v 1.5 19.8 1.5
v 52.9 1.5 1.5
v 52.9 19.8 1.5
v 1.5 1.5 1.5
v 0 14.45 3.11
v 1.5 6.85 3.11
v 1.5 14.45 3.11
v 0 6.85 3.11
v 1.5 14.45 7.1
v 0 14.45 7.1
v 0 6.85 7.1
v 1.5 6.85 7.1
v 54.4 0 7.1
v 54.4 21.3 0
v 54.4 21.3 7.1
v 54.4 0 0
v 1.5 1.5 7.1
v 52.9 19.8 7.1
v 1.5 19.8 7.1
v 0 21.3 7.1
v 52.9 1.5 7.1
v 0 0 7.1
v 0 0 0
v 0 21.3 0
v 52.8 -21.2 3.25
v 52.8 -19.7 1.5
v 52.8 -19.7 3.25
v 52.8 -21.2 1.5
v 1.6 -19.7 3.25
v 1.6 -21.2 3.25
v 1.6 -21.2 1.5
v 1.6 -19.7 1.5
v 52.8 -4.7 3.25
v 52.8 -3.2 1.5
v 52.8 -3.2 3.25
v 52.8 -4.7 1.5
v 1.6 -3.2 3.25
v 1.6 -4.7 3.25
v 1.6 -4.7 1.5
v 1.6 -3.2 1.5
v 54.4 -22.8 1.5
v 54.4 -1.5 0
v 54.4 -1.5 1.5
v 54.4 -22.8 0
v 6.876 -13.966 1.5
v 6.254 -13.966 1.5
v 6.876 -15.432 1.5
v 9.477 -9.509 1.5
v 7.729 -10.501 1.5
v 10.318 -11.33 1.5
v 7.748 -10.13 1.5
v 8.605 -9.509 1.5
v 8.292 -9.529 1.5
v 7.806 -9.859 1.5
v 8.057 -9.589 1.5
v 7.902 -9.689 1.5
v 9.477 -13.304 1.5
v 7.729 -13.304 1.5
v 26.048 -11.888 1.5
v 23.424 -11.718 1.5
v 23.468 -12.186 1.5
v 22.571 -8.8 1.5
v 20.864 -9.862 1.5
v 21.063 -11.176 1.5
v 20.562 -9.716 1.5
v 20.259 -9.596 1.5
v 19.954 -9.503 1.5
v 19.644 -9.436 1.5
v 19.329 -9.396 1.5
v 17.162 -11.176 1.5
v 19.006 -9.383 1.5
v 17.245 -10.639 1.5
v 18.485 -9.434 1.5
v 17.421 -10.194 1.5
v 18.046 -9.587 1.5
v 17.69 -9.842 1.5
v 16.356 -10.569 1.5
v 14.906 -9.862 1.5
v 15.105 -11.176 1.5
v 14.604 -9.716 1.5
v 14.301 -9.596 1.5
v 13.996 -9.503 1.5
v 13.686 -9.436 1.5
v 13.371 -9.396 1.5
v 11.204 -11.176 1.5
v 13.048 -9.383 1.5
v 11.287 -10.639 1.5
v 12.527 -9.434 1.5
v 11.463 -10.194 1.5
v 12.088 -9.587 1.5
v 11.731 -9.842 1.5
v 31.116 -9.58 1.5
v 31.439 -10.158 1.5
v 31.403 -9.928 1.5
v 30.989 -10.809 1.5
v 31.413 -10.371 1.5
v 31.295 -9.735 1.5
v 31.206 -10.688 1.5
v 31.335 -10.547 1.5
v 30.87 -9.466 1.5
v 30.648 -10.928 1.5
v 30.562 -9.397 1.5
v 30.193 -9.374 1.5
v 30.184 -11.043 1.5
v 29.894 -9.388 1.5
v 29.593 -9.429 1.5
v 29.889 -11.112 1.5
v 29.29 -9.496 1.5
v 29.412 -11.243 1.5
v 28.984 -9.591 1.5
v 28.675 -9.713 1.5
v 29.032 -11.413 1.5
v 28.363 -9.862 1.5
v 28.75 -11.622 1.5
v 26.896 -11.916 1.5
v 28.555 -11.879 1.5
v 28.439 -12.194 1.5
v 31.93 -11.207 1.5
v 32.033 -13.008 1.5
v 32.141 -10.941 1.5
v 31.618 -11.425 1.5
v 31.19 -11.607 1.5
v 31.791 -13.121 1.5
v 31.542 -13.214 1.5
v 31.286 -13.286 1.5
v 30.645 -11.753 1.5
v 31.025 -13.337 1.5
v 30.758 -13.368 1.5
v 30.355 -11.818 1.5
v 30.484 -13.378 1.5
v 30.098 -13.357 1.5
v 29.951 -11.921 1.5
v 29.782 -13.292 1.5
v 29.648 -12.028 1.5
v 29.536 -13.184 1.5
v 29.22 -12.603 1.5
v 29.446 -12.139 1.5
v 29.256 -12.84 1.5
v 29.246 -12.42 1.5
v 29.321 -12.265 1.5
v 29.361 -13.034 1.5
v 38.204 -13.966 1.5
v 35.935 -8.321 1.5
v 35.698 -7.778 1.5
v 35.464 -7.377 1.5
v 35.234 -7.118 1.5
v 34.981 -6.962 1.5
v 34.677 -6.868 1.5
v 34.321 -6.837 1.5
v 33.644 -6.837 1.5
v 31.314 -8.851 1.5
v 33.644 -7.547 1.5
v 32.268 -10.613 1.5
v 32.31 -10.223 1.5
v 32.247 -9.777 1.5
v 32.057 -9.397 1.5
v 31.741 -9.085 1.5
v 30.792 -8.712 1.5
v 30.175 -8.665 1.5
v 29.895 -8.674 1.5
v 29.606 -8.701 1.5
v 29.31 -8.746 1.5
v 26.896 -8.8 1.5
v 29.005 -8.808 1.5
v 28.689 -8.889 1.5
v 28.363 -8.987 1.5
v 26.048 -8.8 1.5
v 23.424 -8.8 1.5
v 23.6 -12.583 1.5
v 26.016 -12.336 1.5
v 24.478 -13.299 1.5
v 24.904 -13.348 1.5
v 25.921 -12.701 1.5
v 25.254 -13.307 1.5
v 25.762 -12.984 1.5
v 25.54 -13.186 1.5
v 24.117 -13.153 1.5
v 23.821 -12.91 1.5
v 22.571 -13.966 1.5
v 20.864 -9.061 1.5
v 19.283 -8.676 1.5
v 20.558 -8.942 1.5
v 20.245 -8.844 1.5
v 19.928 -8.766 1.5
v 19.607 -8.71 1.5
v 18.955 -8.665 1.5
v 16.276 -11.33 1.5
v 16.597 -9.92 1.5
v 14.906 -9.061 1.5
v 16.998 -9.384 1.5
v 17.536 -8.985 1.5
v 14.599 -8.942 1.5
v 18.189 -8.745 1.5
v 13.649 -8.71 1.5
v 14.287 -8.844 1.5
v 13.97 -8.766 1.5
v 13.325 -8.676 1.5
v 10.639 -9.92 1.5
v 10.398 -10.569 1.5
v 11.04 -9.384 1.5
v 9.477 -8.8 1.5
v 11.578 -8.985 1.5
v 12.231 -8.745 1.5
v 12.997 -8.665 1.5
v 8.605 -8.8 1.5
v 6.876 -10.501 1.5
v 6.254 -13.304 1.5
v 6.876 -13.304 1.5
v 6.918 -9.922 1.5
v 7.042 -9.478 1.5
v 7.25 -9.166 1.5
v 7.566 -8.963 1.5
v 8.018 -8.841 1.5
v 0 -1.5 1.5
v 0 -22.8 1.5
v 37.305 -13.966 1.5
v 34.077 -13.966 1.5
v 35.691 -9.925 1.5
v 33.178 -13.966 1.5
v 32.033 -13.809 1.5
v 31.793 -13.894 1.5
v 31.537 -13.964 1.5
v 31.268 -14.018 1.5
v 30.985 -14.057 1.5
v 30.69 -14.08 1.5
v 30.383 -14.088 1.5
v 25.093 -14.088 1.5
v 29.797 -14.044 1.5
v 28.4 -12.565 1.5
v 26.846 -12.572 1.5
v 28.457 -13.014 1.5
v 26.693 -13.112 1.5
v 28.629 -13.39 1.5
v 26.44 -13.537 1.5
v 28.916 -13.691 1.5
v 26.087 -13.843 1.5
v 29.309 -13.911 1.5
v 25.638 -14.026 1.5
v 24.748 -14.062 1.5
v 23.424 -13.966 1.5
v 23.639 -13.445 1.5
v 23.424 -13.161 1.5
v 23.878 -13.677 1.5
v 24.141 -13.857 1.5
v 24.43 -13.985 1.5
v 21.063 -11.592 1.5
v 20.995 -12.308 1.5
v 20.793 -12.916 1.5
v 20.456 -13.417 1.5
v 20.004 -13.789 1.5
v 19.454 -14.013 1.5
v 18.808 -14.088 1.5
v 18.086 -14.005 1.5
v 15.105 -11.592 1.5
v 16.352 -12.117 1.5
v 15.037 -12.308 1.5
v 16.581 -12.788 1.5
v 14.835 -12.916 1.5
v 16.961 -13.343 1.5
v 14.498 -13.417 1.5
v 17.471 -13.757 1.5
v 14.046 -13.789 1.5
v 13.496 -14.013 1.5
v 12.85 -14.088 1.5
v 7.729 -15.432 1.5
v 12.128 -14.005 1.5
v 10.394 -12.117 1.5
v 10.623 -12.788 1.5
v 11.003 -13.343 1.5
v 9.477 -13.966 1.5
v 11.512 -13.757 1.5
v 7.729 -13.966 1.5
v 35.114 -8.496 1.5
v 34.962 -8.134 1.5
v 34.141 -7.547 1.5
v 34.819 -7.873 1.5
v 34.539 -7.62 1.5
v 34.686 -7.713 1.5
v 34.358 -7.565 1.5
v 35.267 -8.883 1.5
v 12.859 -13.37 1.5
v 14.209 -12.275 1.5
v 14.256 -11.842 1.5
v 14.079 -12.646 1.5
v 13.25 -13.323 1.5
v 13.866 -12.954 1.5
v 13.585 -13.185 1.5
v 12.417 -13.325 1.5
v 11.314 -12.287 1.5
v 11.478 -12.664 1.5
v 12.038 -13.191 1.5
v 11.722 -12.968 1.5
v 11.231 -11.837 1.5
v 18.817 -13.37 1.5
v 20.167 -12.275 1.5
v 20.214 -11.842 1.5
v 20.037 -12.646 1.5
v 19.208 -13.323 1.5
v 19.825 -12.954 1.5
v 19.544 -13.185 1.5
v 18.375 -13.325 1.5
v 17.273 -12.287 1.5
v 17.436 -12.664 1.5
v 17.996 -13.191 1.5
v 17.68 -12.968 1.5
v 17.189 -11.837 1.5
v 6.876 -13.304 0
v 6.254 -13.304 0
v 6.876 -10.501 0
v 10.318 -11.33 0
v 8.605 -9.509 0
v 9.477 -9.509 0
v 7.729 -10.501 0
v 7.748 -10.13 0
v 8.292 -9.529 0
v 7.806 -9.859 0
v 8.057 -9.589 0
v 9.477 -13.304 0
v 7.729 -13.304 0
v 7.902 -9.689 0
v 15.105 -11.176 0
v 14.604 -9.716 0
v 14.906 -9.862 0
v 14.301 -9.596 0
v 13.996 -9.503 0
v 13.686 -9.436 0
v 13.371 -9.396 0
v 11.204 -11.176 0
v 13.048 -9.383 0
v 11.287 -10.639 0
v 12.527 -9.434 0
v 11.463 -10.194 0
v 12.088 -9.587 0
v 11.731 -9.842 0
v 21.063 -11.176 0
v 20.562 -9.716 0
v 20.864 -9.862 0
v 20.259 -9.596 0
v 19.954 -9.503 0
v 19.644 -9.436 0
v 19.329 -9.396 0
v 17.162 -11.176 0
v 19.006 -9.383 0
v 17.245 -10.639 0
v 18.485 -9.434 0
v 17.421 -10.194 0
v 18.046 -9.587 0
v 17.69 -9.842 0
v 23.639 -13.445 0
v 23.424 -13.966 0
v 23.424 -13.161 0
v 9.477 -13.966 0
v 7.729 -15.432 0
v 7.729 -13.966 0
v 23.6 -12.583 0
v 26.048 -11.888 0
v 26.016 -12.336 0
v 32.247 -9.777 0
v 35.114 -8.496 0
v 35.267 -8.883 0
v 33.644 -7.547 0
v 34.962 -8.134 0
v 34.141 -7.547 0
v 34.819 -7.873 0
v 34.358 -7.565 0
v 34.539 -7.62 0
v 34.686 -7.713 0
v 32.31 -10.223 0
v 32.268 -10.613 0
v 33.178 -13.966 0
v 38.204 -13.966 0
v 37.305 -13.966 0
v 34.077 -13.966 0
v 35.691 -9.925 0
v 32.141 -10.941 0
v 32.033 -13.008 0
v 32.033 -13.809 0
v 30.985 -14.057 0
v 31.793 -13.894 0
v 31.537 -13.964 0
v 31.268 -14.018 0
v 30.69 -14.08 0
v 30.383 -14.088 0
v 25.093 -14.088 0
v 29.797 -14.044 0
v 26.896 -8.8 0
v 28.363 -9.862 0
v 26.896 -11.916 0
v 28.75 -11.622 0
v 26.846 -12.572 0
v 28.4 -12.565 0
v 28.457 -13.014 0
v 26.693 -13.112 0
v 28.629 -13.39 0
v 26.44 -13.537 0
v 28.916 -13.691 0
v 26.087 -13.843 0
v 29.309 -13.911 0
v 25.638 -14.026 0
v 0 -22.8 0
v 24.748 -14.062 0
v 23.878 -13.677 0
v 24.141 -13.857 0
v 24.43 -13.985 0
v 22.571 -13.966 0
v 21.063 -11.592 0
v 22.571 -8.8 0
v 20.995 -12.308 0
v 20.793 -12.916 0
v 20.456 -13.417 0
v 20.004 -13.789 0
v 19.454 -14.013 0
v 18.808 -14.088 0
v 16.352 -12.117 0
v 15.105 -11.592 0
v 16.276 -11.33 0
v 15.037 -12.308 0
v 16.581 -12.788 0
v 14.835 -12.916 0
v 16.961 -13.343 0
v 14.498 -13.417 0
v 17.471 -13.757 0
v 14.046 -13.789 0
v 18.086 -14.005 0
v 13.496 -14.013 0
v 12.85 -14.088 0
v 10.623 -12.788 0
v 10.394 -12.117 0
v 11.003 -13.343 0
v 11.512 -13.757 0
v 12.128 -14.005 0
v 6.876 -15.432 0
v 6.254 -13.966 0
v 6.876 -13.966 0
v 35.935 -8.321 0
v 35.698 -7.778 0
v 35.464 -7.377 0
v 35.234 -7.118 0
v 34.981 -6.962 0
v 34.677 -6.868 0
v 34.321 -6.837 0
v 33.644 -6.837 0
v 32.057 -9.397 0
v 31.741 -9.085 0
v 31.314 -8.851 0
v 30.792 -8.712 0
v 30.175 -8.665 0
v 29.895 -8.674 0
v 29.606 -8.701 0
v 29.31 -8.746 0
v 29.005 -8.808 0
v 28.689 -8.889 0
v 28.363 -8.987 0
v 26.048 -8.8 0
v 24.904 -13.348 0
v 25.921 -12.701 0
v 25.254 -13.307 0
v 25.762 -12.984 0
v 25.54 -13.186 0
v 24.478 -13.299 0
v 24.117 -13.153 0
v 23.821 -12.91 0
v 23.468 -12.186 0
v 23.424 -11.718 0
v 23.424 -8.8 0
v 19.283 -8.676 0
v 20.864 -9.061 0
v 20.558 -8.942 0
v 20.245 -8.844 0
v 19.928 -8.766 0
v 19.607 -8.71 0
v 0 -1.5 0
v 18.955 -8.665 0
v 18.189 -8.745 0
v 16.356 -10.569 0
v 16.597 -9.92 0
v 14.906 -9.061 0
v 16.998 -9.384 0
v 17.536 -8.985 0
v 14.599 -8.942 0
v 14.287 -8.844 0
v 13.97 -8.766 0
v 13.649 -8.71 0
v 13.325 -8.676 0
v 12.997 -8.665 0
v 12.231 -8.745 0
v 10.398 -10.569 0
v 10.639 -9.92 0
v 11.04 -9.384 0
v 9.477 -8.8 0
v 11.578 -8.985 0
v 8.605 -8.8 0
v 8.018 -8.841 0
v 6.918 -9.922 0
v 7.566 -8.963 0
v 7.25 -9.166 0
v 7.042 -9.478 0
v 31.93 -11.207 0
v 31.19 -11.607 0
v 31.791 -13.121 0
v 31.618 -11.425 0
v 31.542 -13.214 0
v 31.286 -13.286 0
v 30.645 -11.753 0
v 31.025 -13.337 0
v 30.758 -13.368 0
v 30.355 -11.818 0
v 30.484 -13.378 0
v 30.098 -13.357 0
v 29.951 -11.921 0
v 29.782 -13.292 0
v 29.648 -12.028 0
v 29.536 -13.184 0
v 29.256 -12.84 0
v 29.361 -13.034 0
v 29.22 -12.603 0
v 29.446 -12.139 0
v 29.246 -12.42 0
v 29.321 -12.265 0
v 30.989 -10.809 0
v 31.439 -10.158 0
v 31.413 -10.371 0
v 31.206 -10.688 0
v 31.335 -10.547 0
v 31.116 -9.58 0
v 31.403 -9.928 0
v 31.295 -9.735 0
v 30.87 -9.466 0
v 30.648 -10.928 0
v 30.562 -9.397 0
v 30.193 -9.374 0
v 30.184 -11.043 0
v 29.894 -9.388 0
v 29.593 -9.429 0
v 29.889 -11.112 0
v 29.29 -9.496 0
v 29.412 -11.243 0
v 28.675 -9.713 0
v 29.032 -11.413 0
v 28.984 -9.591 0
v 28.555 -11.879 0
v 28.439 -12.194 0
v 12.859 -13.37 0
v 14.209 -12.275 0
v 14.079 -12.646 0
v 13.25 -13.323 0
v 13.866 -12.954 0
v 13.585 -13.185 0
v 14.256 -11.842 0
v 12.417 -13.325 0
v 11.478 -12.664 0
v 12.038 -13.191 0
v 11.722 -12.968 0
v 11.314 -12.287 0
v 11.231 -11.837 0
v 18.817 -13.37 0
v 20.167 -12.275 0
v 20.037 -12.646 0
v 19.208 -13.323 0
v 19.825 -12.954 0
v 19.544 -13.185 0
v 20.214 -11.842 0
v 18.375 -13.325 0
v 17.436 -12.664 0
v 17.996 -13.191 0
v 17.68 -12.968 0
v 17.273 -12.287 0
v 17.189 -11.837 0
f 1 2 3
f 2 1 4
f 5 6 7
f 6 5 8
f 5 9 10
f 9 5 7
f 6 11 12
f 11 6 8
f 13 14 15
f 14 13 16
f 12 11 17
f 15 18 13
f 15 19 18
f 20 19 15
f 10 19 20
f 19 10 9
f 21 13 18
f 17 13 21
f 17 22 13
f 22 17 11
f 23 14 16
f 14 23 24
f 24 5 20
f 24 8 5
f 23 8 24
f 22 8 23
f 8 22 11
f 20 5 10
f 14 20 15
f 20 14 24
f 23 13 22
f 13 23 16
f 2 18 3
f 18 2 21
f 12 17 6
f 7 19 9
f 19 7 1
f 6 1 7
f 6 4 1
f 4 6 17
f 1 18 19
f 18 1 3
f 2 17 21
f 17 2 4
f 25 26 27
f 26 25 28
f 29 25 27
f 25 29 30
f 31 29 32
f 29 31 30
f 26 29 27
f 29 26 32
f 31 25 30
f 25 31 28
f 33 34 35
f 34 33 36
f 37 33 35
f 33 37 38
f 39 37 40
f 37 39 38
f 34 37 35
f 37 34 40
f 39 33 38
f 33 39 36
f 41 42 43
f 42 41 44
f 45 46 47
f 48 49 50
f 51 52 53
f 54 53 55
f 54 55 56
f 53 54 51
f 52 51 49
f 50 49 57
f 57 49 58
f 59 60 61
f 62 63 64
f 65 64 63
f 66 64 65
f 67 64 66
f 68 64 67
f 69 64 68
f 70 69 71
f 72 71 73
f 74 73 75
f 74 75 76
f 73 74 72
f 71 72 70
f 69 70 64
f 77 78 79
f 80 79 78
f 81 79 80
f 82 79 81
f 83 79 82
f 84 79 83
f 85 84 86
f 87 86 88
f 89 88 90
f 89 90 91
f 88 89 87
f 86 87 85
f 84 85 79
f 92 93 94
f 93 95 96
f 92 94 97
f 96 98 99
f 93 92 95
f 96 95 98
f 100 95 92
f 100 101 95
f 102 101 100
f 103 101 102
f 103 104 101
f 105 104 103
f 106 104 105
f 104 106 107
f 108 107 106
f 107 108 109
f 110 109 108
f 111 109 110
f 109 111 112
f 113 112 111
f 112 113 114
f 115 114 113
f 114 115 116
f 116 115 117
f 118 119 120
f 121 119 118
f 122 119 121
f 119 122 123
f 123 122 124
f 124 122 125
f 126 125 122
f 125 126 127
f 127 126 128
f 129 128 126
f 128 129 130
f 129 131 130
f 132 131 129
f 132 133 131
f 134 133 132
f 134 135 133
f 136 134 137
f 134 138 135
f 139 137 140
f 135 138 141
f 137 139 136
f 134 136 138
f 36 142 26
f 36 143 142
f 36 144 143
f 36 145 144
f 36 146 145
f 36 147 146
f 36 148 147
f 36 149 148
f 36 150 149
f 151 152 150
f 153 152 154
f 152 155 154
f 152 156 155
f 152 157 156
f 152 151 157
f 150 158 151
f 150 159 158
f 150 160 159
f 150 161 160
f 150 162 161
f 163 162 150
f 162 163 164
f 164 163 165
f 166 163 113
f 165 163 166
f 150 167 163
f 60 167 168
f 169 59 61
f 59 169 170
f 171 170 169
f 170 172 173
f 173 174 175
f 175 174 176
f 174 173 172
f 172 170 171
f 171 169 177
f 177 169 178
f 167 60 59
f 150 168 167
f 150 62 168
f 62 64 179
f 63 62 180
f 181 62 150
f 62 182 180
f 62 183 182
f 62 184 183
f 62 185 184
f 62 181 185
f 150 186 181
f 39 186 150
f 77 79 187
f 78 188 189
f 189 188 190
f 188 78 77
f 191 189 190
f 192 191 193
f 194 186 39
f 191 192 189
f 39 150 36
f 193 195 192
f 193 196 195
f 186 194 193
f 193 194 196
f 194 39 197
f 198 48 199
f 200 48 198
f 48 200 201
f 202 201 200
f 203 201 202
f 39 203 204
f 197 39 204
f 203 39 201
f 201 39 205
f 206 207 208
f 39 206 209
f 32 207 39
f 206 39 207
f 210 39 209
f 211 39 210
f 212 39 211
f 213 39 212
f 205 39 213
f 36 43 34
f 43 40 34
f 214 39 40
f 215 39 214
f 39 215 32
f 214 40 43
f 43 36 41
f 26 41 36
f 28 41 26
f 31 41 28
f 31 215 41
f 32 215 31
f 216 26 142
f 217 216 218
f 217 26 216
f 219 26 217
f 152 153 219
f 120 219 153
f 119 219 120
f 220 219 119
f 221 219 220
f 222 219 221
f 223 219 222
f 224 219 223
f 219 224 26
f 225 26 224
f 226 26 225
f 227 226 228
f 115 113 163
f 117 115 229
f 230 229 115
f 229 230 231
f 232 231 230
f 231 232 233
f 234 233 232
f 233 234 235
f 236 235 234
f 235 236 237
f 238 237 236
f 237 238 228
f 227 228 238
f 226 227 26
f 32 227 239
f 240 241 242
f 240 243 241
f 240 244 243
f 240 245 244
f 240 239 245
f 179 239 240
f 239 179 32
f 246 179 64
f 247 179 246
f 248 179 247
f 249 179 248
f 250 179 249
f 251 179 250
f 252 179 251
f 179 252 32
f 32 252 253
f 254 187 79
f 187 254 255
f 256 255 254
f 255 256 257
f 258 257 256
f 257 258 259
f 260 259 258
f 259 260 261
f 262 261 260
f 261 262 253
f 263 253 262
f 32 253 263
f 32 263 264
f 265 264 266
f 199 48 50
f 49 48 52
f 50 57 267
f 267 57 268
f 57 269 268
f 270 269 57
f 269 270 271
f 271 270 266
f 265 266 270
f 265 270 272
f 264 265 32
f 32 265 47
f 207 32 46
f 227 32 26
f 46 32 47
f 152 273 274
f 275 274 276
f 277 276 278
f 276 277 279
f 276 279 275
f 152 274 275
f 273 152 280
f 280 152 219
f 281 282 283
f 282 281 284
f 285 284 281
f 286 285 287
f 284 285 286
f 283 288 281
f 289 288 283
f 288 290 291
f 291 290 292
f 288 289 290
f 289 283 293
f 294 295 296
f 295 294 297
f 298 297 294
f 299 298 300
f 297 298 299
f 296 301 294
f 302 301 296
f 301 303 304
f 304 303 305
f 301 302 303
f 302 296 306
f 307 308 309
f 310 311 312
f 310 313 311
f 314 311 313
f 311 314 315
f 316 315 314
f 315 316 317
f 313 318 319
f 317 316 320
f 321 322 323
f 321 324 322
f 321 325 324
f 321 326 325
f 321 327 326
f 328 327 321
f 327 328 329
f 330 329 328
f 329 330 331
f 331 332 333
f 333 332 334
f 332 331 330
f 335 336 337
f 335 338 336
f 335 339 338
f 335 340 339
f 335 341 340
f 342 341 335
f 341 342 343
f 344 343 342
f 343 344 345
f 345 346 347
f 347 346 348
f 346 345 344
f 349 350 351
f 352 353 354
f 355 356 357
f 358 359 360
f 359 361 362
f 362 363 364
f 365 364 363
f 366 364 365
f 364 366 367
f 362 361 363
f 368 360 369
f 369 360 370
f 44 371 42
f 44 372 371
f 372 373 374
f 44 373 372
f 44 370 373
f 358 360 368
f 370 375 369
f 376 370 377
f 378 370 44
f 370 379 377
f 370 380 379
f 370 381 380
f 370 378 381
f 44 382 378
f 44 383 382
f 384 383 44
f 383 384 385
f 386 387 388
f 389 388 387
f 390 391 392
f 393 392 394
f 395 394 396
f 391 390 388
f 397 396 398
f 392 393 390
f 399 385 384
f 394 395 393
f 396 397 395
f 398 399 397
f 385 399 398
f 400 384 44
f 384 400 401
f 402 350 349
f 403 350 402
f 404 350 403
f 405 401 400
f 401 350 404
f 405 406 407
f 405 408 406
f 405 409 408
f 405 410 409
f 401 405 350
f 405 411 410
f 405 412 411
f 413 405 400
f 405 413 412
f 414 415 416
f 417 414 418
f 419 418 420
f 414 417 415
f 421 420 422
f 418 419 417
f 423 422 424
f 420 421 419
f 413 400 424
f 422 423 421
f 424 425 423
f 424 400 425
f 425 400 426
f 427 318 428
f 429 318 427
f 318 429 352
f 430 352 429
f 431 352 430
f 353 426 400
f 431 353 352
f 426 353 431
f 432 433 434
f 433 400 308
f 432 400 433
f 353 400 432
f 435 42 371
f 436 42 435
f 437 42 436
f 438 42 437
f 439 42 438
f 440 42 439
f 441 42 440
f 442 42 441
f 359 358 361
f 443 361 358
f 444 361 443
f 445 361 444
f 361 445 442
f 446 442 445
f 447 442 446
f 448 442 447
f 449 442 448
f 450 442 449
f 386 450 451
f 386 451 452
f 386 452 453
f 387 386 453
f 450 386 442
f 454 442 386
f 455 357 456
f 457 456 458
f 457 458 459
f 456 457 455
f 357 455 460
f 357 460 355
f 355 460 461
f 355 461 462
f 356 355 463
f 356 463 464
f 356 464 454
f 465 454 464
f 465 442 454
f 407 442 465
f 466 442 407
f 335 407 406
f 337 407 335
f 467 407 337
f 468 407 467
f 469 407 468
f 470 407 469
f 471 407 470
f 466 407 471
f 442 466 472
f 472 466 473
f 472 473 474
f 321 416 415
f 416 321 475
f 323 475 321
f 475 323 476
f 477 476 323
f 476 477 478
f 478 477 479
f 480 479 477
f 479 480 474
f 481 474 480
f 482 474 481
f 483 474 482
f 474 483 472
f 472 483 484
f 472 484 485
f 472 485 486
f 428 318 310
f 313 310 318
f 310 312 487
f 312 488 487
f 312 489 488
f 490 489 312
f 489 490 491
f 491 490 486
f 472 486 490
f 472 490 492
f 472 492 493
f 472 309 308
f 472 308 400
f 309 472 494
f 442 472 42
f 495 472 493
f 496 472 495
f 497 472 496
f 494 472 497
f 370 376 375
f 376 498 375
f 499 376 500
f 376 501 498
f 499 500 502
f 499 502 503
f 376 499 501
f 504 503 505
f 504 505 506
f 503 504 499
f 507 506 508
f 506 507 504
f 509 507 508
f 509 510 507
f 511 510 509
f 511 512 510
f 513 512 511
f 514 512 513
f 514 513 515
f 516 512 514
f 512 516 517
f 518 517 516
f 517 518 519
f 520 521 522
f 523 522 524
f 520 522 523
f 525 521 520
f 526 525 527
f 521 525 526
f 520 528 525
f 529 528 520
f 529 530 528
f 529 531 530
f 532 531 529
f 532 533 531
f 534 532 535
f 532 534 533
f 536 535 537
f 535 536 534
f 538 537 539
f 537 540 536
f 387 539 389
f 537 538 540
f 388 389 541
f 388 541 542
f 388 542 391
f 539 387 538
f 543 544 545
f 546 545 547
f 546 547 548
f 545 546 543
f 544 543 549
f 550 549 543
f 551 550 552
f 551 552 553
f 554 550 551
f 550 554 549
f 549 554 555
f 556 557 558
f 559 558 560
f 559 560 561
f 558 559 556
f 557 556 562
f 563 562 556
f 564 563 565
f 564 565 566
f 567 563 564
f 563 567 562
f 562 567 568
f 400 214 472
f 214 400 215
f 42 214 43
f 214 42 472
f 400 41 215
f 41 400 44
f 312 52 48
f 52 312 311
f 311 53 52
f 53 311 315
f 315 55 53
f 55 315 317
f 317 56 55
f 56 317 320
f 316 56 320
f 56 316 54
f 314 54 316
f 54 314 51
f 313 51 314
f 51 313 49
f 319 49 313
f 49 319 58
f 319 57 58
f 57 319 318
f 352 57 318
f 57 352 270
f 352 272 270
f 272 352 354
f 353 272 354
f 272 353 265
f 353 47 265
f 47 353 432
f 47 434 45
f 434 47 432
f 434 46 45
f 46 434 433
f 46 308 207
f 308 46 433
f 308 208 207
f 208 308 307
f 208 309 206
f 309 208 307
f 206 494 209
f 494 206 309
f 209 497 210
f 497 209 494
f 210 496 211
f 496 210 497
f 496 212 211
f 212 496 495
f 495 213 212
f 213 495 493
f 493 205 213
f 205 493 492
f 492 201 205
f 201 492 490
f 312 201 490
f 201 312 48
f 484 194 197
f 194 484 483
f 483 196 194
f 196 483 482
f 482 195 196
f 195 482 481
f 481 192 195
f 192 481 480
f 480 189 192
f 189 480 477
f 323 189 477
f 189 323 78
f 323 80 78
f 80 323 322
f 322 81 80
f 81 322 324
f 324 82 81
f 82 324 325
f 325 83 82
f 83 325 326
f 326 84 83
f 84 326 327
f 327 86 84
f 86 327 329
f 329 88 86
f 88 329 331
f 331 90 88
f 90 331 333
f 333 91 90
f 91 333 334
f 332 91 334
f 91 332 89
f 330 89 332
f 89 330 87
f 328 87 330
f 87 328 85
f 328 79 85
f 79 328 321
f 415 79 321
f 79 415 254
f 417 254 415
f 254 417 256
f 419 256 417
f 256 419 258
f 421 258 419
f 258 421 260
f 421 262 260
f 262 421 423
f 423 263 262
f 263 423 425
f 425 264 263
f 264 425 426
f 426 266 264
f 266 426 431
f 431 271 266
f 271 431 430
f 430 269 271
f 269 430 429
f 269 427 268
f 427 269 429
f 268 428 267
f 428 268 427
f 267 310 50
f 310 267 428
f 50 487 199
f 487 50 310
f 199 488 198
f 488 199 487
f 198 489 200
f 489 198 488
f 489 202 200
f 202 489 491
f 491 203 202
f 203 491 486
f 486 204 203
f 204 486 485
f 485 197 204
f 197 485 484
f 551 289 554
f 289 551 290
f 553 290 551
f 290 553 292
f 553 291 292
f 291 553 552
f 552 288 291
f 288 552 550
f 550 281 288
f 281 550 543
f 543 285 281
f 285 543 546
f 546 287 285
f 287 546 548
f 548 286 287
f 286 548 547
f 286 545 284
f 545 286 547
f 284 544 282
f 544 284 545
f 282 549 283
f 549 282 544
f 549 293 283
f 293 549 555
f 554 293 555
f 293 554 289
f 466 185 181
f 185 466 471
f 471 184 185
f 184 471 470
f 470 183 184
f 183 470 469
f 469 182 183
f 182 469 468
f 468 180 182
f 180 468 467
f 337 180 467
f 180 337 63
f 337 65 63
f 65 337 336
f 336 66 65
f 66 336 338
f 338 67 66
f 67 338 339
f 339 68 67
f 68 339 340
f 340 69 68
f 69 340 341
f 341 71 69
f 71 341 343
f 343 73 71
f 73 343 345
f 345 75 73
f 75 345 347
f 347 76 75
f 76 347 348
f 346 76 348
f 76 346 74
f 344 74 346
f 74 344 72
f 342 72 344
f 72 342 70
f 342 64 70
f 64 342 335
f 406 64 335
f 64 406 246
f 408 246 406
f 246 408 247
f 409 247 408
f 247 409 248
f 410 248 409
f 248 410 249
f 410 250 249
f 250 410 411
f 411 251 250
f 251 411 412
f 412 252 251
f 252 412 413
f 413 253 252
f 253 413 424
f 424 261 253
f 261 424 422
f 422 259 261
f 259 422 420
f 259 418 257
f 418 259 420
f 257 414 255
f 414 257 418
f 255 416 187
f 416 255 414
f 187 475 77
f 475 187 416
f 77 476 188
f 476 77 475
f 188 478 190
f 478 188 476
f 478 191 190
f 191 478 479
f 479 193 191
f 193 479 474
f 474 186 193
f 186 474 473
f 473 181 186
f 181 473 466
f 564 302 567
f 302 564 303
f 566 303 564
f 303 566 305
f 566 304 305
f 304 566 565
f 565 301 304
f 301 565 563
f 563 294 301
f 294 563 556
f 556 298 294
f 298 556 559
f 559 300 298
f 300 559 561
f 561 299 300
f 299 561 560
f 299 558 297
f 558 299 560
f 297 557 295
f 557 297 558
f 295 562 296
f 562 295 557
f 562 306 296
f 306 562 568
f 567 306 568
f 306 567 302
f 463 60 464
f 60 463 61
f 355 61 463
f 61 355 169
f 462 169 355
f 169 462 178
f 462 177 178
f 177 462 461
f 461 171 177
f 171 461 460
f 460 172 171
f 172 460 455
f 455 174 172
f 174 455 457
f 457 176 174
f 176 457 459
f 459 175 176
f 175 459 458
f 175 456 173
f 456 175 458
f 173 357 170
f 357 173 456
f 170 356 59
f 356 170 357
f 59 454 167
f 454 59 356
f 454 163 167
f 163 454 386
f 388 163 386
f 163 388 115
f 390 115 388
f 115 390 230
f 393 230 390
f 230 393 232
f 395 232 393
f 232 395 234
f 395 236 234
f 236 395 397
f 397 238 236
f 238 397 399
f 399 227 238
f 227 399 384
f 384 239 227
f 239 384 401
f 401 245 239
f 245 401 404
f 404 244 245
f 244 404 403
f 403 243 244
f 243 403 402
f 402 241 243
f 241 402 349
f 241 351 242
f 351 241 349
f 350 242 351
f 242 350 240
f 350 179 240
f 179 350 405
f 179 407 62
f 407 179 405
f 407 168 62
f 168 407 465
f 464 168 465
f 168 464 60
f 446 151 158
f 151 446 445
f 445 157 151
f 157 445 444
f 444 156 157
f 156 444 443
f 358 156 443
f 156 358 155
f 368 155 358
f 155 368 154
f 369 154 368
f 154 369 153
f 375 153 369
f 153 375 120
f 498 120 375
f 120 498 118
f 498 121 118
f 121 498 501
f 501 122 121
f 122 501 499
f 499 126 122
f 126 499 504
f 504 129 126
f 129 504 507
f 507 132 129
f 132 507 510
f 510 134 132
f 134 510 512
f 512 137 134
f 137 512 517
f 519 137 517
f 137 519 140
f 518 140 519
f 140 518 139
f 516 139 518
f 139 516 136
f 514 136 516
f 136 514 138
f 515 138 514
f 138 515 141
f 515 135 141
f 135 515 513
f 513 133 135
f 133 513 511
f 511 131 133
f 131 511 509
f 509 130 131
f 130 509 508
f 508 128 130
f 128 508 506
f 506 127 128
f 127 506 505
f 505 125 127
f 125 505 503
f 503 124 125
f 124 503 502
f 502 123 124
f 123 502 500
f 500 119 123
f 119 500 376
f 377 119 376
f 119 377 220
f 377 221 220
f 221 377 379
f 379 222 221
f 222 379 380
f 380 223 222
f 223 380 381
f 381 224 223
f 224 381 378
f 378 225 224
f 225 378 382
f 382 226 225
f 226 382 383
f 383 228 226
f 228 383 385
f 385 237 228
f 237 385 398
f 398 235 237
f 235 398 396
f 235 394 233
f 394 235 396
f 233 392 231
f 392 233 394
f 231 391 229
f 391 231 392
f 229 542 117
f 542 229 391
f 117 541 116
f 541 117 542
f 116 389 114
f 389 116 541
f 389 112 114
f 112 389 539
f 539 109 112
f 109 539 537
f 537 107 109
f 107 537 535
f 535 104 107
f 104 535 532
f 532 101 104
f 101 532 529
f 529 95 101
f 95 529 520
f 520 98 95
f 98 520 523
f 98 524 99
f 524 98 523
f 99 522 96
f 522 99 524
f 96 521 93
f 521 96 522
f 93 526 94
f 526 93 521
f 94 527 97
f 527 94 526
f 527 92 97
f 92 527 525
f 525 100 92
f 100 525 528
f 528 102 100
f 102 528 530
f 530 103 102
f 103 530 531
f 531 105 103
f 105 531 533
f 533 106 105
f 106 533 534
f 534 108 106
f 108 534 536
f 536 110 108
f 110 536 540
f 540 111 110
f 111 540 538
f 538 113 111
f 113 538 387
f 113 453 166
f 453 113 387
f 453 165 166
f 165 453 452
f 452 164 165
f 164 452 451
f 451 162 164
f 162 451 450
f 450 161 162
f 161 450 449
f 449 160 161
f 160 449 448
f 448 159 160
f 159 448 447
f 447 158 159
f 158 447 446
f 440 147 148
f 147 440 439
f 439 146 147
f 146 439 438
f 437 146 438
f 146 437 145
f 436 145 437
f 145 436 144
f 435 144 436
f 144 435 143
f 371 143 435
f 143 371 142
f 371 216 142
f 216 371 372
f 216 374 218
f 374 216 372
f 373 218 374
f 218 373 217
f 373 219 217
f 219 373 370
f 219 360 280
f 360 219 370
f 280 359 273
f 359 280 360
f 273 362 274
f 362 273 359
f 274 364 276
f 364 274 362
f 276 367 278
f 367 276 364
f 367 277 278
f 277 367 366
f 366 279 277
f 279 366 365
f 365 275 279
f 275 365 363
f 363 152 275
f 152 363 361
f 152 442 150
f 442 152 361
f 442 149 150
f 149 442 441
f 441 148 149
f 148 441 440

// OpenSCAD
// file: Teensy++2.scad
// Teensy++ 2 
// Loic - Novemeber 2017


teensyplusplus2();

board_length 	= 51.2;
board_width		= 18.1;
board_height	= 1.6 + 4;	// board + usb connector

// reset button
module resetButton()
{
	color("grey")
		cube(size=[3,4,1], center=false);

	translate([1.5,2,1])
	color("black")
		cylinder(h=0.5, r=1, center=false, $fn=20);
}

module microUSBConnector()
{
	cube(size=[9.9 + 5,7.6,4], center=false);	// + 5 is dummy long for thick wall
}

//board
module teensyplusplus2()
{
	color("green")
		cube(size=[board_length,board_width,board_height], center=false);

	translate([45,9.05-2,board_height])
		resetButton();

	translate([-5,5.25,1.61])
		microUSBConnector();
}
// main file
// Teensy++ 2 Enclosure
// Loic - Novemeber 2017

use <Teensy++2.scad>


//TODO NEED FIXING, asymetric

board_length 	= 51.2;
board_width		= 18.1;
board_height	= 1.6 + 4;	// board + usb connector
walls_depth		= 1.5;
clearance		= 0.1;		// margin for print tolerance .1mm


///////
box_length		= walls_depth + clearance + board_length + clearance + walls_depth;
box_width		= walls_depth + clearance + board_width + clearance + walls_depth;
box_height		= walls_depth + board_height;

inside_length	= clearance + board_length + clearance;
inside_width	= clearance + board_width + clearance;
inside_height	= walls_depth + board_height;


// MAIN //
box();

translate([0,-box_width - walls_depth,0])
	top_with_label();
//////////

module label()
{
	translate([6,14,2])
	rotate([180,0,0])
	linear_extrude(5)
		text("teensy", font = "wipeoutfusion", size=6.8,spacing=1.05);
}

module top_with_label()
{
	difference()
	{
		top();
		label();
	}
}

module box()
{
difference()
	{
		color("red")
			cube(size=[box_length,box_width,box_height], center=false);

		translate([walls_depth,walls_depth,walls_depth])
			cube(size=[inside_length,inside_width,inside_height], center=false);

		translate([walls_depth + clearance,walls_depth + clearance,walls_depth])
		 	teensyplusplus2();
	}
}

module top()
{
	color("blue")
		cube(size=[box_length,box_width,walls_depth], center=false);

	// tabs / rails
	color("purple")
	{
		translate([walls_depth + clearance, walls_depth + clearance,1])
			cube(size=[box_length - 2*(walls_depth + clearance),walls_depth,walls_depth*1.5], center=false);

		translate([walls_depth + clearance, box_width - 2 * (walls_depth + clearance) ,1])
			cube(size=[box_length - 2*(walls_depth + clearance),walls_depth,walls_depth*1.5], center=false);
	}
}
